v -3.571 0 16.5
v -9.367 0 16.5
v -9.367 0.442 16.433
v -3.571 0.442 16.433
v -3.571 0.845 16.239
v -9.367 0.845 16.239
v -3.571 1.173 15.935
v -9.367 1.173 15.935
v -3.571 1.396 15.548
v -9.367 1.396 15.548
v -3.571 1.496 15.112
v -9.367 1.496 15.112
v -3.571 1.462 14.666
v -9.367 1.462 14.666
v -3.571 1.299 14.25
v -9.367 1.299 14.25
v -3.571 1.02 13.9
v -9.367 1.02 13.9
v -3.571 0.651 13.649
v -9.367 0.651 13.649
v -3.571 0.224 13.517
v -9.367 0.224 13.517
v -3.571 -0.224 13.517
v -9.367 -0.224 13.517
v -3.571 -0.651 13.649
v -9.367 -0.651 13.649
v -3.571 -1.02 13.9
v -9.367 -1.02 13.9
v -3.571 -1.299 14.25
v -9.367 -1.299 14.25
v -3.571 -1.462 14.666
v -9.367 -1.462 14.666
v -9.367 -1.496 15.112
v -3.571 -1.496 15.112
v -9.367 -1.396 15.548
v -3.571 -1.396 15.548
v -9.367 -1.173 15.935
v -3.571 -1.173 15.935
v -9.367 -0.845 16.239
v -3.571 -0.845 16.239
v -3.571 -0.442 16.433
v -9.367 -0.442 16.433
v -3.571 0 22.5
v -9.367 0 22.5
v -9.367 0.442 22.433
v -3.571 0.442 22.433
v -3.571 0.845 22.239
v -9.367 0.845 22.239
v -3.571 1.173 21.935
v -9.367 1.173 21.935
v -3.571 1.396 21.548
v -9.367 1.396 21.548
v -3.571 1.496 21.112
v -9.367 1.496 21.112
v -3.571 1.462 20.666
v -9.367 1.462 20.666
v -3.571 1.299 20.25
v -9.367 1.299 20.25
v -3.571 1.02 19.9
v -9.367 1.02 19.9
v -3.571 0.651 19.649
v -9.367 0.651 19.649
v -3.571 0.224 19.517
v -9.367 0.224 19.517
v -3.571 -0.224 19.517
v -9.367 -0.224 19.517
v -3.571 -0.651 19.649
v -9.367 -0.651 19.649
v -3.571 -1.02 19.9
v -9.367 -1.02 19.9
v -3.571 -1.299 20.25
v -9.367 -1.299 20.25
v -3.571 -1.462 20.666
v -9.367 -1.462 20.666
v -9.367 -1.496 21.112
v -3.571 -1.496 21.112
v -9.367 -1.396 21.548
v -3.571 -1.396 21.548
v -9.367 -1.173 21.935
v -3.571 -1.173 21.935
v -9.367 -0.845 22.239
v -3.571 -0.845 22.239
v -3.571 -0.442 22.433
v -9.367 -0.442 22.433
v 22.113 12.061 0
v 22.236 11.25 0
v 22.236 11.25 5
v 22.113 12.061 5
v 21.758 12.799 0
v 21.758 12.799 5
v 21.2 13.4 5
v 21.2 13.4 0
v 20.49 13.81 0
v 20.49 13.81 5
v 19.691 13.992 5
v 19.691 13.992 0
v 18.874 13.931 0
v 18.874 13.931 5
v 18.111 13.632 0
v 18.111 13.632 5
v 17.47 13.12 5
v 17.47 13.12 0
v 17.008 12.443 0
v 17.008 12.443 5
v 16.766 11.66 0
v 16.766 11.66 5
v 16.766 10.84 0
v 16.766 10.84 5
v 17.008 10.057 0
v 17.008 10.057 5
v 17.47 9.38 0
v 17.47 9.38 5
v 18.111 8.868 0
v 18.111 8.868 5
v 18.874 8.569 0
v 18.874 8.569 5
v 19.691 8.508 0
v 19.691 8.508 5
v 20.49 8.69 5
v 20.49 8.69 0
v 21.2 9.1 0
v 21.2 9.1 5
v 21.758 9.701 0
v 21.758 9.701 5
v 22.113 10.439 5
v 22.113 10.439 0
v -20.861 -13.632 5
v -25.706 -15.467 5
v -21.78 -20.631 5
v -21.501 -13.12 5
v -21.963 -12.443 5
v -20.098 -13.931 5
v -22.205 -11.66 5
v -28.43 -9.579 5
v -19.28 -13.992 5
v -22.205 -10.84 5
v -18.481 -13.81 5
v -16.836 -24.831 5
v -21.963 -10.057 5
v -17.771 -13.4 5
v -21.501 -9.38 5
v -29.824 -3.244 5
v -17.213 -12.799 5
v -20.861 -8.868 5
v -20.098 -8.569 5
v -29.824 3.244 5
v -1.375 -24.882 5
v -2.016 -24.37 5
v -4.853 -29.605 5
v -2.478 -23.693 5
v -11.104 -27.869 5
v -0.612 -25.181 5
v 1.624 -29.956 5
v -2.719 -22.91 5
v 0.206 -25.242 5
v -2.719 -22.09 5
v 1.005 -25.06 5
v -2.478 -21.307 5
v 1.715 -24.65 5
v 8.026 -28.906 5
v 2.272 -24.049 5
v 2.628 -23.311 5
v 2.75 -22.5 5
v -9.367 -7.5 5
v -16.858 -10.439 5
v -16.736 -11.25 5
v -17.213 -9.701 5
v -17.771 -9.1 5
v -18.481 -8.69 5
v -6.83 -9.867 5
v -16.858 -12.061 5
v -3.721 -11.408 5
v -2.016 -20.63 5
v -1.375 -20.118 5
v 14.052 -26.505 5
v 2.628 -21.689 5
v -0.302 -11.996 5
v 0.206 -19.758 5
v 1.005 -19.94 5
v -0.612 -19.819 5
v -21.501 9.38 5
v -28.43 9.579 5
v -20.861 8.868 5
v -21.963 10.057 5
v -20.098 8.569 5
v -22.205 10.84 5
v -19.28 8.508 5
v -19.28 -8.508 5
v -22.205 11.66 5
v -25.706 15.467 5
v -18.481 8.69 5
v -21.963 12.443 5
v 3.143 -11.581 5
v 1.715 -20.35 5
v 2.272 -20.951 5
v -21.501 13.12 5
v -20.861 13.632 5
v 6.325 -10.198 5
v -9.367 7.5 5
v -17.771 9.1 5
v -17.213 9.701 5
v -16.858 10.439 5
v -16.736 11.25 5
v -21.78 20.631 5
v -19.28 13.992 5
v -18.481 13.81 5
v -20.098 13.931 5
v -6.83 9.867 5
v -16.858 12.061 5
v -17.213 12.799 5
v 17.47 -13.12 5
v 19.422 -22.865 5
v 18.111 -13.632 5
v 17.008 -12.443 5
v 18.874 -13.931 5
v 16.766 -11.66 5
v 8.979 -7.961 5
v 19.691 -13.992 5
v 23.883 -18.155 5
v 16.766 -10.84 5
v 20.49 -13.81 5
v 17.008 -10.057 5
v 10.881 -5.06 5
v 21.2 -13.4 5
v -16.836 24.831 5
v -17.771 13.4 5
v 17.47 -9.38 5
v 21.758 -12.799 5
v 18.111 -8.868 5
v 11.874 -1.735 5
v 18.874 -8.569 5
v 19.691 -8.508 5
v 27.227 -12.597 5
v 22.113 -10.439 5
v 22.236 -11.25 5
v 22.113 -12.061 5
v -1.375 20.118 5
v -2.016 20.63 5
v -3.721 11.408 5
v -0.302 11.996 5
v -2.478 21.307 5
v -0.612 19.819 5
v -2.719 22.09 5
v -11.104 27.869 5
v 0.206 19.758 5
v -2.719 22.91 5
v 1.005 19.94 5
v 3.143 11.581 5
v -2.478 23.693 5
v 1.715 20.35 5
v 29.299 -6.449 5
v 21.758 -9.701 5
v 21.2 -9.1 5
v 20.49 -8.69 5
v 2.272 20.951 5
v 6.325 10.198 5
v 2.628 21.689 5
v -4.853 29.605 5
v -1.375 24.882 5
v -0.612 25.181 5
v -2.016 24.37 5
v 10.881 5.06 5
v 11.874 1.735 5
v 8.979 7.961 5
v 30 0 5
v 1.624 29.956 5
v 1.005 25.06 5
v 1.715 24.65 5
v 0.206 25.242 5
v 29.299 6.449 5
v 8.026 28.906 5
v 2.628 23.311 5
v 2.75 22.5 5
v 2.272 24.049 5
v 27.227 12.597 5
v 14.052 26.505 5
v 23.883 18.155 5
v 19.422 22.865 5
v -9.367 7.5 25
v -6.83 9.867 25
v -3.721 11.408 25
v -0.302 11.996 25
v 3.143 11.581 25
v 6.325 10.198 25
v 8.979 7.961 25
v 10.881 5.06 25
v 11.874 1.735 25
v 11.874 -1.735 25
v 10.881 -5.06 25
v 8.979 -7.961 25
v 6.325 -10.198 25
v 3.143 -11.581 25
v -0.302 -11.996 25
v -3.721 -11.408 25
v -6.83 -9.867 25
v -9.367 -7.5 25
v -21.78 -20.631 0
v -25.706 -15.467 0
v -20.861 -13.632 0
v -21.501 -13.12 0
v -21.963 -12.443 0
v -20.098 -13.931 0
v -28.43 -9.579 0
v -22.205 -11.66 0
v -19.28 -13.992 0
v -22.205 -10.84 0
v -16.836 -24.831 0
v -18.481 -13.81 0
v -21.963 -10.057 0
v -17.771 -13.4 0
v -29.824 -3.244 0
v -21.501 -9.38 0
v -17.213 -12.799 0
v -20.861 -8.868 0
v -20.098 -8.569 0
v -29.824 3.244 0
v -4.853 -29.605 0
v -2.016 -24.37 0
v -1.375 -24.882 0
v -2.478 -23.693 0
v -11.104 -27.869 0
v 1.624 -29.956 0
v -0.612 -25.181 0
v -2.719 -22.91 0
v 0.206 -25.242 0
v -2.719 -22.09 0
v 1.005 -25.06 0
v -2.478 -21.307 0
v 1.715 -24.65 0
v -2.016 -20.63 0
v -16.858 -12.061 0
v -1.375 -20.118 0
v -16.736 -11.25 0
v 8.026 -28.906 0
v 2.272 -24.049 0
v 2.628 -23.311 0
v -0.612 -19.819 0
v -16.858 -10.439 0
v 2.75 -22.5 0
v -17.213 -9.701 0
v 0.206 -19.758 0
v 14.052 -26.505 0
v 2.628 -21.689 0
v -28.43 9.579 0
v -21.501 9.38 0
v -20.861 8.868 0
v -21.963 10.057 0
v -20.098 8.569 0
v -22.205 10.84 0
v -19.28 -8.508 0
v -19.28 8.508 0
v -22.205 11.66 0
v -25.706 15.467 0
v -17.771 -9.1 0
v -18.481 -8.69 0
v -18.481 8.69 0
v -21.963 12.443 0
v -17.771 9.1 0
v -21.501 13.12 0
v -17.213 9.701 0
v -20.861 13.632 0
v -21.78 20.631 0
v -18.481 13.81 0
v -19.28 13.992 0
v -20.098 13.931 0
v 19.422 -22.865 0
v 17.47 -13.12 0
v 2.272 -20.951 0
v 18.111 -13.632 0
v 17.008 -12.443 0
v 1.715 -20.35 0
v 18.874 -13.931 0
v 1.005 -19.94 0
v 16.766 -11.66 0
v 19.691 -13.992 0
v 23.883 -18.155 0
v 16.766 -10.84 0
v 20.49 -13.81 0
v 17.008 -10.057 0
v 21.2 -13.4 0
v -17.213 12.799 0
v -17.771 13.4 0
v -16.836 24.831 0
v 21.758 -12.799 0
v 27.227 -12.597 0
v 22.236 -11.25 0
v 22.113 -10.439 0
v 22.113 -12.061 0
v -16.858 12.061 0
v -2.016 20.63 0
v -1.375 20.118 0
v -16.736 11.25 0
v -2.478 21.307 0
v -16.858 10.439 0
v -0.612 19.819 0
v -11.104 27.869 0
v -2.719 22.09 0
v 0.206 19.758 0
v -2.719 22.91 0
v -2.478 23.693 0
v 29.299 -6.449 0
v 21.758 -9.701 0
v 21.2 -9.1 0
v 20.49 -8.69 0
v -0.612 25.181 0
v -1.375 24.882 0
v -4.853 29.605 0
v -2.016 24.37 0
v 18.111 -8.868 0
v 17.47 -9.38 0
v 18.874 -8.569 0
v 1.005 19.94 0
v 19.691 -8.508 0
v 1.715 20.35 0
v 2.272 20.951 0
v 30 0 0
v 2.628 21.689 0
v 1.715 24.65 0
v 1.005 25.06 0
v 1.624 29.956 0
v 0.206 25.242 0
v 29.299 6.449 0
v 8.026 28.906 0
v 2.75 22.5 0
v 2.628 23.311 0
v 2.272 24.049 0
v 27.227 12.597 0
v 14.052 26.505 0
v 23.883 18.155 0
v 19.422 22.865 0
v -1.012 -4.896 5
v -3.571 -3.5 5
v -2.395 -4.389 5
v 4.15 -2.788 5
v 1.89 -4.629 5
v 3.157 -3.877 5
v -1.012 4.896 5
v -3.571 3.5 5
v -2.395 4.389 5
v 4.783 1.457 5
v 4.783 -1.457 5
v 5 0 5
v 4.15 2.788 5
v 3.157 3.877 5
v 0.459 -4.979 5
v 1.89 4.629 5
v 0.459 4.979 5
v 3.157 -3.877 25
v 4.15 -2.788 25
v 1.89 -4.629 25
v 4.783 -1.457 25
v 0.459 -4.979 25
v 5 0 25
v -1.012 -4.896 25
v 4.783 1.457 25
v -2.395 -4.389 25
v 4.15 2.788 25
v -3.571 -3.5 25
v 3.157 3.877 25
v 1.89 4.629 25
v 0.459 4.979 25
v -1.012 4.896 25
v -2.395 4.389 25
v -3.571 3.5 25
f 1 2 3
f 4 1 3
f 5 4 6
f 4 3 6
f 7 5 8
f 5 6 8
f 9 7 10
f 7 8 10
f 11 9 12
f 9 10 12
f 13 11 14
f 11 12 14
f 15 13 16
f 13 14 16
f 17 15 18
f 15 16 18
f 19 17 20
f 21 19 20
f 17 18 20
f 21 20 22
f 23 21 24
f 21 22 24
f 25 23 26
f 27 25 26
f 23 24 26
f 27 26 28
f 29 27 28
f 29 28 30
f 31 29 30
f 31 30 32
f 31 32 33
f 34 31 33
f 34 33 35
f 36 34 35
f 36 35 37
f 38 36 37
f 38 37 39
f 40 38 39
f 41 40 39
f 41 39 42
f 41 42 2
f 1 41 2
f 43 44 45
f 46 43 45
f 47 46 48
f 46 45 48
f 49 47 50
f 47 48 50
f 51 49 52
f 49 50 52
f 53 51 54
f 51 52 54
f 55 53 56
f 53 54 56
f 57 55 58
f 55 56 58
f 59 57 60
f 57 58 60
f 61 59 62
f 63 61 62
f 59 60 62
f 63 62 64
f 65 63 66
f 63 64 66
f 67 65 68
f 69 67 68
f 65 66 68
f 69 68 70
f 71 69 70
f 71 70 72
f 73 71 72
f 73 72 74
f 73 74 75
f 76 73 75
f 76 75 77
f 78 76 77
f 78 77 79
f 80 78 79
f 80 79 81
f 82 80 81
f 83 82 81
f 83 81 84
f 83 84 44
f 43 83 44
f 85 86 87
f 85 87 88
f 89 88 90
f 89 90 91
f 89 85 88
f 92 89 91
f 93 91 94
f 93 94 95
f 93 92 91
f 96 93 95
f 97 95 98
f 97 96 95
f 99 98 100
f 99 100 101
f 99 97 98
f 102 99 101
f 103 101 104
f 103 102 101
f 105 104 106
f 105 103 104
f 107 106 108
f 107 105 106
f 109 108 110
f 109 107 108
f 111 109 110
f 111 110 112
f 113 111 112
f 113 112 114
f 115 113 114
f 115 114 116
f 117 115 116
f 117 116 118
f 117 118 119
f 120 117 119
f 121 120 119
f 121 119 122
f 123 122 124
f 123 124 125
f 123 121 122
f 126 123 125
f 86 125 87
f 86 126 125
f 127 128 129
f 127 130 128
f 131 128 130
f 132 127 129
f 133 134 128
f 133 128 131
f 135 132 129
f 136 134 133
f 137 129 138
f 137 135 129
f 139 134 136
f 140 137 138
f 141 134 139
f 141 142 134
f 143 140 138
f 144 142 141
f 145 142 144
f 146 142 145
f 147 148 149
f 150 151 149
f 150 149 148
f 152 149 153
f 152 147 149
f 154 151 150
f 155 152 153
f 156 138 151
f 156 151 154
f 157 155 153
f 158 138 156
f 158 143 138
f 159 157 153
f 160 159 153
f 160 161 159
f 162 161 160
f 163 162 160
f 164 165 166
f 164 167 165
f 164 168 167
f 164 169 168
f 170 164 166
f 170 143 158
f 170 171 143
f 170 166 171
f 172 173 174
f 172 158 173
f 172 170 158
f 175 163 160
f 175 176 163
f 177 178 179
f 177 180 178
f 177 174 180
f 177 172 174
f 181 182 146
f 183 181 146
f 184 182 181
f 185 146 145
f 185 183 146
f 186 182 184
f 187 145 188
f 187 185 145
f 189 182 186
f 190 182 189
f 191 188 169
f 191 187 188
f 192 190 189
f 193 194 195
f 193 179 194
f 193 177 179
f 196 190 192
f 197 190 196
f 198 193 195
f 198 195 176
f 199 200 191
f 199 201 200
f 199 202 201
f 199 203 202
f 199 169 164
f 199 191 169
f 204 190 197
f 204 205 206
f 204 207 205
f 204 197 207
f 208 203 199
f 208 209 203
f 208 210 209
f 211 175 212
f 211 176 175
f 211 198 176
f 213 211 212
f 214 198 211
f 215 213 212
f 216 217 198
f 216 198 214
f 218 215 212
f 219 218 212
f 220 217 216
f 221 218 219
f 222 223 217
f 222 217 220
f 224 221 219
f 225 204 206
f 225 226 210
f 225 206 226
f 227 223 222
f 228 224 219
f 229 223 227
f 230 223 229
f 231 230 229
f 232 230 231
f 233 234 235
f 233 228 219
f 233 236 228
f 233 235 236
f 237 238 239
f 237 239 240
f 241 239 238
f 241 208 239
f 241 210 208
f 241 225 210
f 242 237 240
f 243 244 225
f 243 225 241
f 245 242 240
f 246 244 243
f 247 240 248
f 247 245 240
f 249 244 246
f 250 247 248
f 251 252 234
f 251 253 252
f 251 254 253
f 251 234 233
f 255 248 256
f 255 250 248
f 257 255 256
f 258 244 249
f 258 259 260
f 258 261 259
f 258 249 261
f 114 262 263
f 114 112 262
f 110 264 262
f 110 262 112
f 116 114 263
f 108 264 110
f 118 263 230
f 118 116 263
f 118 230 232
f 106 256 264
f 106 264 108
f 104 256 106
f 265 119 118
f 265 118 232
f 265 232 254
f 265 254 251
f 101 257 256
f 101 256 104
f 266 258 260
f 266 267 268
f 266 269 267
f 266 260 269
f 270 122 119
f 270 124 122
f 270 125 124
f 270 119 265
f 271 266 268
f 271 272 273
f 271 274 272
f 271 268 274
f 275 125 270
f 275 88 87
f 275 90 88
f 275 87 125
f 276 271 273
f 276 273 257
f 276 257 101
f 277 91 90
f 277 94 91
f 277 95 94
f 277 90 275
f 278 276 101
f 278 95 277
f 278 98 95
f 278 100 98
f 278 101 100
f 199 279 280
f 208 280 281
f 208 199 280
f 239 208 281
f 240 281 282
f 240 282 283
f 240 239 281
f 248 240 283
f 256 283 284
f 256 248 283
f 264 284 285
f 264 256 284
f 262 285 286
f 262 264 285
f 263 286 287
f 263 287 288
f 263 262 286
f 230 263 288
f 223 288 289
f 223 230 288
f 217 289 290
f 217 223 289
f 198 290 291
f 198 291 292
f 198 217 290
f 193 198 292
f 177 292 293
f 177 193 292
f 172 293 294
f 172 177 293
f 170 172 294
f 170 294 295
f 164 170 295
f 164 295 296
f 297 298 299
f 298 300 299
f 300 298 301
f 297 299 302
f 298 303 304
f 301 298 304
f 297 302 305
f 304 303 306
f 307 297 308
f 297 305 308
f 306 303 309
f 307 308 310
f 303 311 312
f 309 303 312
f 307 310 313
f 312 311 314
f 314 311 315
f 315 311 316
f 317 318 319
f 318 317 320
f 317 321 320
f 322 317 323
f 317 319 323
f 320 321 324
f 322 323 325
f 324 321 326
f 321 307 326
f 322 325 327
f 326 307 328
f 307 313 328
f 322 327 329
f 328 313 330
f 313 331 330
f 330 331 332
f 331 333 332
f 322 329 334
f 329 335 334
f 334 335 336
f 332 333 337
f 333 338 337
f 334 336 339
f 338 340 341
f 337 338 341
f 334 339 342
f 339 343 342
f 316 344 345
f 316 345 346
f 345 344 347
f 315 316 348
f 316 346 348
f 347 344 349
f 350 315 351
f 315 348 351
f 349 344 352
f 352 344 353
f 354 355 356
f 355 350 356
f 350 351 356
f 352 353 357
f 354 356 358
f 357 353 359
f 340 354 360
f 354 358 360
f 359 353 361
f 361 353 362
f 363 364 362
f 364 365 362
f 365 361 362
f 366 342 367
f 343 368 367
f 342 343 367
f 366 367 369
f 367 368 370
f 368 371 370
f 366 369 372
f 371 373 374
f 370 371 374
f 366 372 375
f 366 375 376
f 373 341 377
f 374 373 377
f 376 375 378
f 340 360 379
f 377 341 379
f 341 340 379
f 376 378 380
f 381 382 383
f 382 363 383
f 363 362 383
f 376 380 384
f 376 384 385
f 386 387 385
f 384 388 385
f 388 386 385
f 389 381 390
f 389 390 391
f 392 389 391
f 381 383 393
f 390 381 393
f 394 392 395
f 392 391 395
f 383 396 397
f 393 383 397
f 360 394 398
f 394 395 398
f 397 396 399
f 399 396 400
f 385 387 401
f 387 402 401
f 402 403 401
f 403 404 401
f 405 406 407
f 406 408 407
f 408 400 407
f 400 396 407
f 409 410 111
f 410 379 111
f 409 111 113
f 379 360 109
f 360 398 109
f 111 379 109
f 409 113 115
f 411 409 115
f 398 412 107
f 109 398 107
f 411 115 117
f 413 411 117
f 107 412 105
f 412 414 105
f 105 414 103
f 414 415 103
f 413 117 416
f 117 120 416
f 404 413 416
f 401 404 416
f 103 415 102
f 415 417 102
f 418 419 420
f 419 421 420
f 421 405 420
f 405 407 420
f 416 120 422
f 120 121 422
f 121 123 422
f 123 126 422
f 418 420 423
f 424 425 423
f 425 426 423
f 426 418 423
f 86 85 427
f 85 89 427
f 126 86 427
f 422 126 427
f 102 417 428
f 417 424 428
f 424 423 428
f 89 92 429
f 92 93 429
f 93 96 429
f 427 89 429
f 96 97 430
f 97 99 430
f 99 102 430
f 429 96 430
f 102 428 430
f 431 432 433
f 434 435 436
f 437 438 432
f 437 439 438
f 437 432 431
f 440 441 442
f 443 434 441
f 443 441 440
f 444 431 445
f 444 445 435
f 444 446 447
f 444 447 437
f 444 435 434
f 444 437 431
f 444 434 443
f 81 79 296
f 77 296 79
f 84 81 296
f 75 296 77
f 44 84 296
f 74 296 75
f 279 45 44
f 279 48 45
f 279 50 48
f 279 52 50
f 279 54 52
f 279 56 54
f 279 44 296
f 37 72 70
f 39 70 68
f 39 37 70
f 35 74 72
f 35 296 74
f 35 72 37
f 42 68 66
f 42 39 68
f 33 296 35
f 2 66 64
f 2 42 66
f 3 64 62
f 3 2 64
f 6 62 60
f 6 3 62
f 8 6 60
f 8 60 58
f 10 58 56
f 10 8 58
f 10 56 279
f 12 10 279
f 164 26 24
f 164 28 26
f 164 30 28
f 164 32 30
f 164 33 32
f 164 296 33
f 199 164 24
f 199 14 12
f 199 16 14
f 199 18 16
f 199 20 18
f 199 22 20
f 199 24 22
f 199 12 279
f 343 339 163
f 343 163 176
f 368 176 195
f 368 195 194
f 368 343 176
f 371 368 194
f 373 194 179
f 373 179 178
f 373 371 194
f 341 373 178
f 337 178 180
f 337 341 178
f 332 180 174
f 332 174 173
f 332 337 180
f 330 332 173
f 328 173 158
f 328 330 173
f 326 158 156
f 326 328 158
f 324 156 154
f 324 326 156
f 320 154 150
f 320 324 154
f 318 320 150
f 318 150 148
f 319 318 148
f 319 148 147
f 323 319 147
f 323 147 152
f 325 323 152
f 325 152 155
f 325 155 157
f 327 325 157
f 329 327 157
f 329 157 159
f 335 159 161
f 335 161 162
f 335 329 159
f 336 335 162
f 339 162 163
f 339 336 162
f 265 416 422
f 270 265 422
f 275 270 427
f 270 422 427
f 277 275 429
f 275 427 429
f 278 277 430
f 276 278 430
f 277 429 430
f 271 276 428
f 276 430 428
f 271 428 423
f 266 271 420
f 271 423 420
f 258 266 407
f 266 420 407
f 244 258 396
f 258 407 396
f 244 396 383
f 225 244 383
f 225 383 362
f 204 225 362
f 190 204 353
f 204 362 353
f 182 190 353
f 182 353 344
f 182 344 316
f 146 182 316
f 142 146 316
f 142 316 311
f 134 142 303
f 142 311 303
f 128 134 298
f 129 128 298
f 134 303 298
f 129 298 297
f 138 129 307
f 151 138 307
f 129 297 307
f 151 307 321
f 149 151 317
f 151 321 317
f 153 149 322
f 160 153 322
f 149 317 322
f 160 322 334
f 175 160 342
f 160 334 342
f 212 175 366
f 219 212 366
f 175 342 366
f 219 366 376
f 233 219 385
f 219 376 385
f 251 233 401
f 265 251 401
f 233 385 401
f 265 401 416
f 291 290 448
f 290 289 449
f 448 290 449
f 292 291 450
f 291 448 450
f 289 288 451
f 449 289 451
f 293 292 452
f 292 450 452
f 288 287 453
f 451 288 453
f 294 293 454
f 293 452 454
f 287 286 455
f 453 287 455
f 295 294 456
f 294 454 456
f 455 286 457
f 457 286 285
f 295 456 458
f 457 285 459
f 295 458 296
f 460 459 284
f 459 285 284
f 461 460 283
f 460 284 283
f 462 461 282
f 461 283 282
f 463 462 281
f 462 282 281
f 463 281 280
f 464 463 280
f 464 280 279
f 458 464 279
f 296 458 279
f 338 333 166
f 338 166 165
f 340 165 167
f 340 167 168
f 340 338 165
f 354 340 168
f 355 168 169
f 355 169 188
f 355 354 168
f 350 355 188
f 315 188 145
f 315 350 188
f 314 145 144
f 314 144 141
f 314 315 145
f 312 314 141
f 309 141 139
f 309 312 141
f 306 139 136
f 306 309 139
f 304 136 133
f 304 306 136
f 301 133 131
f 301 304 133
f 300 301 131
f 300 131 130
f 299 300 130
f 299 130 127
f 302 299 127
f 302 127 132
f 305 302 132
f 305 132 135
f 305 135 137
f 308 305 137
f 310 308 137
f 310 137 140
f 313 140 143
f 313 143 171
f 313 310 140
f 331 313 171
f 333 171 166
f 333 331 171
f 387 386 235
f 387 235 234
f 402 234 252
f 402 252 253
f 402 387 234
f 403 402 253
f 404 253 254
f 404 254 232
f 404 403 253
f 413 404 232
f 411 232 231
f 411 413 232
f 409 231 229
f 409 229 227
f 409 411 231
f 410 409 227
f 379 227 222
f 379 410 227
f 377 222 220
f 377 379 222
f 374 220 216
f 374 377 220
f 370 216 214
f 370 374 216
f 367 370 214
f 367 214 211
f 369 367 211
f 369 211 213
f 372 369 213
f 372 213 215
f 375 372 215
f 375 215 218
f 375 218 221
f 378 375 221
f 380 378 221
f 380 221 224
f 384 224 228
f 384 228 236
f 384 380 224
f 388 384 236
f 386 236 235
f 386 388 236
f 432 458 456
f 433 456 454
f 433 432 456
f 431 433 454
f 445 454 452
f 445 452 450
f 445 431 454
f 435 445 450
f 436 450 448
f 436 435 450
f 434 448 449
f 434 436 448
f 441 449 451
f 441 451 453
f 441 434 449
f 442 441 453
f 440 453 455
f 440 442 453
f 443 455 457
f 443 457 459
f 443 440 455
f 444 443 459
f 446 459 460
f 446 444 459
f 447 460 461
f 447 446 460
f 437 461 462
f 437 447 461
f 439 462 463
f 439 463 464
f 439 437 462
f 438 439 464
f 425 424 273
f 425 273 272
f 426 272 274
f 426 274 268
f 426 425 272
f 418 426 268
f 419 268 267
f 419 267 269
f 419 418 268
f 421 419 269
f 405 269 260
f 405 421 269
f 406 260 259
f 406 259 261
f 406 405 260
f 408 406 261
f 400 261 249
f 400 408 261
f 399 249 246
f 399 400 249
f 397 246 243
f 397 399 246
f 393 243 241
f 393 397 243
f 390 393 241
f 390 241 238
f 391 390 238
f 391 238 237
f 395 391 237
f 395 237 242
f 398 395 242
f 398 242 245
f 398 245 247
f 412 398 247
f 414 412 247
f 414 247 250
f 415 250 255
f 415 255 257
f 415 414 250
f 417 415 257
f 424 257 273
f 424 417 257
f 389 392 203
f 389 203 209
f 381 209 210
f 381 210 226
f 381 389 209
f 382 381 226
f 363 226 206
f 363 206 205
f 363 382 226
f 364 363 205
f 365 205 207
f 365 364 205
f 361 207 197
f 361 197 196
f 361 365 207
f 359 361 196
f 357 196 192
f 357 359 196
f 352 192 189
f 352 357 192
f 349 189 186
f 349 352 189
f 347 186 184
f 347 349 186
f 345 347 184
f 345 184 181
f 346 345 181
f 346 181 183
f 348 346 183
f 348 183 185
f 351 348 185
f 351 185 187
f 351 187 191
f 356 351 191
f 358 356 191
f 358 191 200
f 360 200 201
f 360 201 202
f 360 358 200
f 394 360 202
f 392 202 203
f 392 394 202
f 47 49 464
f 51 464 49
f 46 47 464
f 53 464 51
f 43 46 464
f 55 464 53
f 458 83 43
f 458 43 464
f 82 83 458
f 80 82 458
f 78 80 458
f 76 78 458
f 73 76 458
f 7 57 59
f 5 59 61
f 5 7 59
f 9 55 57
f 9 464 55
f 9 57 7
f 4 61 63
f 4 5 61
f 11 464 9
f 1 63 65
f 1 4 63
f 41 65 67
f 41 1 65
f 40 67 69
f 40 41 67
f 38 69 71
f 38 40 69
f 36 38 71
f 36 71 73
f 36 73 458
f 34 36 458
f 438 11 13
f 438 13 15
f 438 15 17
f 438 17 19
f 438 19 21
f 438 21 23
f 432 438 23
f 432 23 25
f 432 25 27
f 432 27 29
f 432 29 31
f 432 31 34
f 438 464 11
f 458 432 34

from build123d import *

# Parameters (mm, degrees)
SKETCH_1_R          = 30
SKETCH_1_R_2        = 2.75
EXTRUDE_1_DEPTH     = 5
EXTRUDE_2_DEPTH     = 20
SKETCH_3_R          = 1.5
CUT_EXTRUDE_1_DEPTH = 10


with BuildPart() as part:
    # 草图1 → 凸台-拉伸1 (new body)
    with BuildSketch(Plane.XY):
        Circle(SKETCH_1_R)
        with Locations((0, 22.5)):
            Circle(SKETCH_1_R_2, mode=Mode.SUBTRACT)
        with Locations((19.485571585, 11.25)):
            Circle(SKETCH_1_R_2, mode=Mode.SUBTRACT)
        with Locations((19.485571585, -11.25)):
            Circle(SKETCH_1_R_2, mode=Mode.SUBTRACT)
        with Locations((0, -22.5)):
            Circle(SKETCH_1_R_2, mode=Mode.SUBTRACT)
        with Locations((-19.485571585, -11.25)):
            Circle(SKETCH_1_R_2, mode=Mode.SUBTRACT)
        with Locations((-19.485571585, 11.25)):
            Circle(SKETCH_1_R_2, mode=Mode.SUBTRACT)
    extrude(amount=EXTRUDE_1_DEPTH)

    # 草图2 → 凸台-拉伸2 (add)
    with BuildSketch(Plane.XY.offset(5)):
        with BuildLine():
            Line((-9.367496998, -7.5), (-9.367496998, 7.5))
            ThreePointArc((-9.367496998, 7.5), (12, 0), (-9.367496998, -7.5))
        make_face()
        with BuildLine():
            Line((-3.570714214, 3.5), (-3.570714214, -3.5))
            ThreePointArc((-3.570714214, -3.5), (5, 0), (-3.570714214, 3.5))
        make_face(mode=Mode.SUBTRACT)
    extrude(amount=EXTRUDE_2_DEPTH)

    # 草图3 → 切除-拉伸1 (cut)
    with BuildSketch(Plane.ZY.offset(9.367496998)):
        with Locations((21, 0)):
            Circle(SKETCH_3_R)
        with Locations((15, 0)):
            Circle(SKETCH_3_R)
    extrude(amount=-CUT_EXTRUDE_1_DEPTH, mode=Mode.SUBTRACT)


solid = part.part
